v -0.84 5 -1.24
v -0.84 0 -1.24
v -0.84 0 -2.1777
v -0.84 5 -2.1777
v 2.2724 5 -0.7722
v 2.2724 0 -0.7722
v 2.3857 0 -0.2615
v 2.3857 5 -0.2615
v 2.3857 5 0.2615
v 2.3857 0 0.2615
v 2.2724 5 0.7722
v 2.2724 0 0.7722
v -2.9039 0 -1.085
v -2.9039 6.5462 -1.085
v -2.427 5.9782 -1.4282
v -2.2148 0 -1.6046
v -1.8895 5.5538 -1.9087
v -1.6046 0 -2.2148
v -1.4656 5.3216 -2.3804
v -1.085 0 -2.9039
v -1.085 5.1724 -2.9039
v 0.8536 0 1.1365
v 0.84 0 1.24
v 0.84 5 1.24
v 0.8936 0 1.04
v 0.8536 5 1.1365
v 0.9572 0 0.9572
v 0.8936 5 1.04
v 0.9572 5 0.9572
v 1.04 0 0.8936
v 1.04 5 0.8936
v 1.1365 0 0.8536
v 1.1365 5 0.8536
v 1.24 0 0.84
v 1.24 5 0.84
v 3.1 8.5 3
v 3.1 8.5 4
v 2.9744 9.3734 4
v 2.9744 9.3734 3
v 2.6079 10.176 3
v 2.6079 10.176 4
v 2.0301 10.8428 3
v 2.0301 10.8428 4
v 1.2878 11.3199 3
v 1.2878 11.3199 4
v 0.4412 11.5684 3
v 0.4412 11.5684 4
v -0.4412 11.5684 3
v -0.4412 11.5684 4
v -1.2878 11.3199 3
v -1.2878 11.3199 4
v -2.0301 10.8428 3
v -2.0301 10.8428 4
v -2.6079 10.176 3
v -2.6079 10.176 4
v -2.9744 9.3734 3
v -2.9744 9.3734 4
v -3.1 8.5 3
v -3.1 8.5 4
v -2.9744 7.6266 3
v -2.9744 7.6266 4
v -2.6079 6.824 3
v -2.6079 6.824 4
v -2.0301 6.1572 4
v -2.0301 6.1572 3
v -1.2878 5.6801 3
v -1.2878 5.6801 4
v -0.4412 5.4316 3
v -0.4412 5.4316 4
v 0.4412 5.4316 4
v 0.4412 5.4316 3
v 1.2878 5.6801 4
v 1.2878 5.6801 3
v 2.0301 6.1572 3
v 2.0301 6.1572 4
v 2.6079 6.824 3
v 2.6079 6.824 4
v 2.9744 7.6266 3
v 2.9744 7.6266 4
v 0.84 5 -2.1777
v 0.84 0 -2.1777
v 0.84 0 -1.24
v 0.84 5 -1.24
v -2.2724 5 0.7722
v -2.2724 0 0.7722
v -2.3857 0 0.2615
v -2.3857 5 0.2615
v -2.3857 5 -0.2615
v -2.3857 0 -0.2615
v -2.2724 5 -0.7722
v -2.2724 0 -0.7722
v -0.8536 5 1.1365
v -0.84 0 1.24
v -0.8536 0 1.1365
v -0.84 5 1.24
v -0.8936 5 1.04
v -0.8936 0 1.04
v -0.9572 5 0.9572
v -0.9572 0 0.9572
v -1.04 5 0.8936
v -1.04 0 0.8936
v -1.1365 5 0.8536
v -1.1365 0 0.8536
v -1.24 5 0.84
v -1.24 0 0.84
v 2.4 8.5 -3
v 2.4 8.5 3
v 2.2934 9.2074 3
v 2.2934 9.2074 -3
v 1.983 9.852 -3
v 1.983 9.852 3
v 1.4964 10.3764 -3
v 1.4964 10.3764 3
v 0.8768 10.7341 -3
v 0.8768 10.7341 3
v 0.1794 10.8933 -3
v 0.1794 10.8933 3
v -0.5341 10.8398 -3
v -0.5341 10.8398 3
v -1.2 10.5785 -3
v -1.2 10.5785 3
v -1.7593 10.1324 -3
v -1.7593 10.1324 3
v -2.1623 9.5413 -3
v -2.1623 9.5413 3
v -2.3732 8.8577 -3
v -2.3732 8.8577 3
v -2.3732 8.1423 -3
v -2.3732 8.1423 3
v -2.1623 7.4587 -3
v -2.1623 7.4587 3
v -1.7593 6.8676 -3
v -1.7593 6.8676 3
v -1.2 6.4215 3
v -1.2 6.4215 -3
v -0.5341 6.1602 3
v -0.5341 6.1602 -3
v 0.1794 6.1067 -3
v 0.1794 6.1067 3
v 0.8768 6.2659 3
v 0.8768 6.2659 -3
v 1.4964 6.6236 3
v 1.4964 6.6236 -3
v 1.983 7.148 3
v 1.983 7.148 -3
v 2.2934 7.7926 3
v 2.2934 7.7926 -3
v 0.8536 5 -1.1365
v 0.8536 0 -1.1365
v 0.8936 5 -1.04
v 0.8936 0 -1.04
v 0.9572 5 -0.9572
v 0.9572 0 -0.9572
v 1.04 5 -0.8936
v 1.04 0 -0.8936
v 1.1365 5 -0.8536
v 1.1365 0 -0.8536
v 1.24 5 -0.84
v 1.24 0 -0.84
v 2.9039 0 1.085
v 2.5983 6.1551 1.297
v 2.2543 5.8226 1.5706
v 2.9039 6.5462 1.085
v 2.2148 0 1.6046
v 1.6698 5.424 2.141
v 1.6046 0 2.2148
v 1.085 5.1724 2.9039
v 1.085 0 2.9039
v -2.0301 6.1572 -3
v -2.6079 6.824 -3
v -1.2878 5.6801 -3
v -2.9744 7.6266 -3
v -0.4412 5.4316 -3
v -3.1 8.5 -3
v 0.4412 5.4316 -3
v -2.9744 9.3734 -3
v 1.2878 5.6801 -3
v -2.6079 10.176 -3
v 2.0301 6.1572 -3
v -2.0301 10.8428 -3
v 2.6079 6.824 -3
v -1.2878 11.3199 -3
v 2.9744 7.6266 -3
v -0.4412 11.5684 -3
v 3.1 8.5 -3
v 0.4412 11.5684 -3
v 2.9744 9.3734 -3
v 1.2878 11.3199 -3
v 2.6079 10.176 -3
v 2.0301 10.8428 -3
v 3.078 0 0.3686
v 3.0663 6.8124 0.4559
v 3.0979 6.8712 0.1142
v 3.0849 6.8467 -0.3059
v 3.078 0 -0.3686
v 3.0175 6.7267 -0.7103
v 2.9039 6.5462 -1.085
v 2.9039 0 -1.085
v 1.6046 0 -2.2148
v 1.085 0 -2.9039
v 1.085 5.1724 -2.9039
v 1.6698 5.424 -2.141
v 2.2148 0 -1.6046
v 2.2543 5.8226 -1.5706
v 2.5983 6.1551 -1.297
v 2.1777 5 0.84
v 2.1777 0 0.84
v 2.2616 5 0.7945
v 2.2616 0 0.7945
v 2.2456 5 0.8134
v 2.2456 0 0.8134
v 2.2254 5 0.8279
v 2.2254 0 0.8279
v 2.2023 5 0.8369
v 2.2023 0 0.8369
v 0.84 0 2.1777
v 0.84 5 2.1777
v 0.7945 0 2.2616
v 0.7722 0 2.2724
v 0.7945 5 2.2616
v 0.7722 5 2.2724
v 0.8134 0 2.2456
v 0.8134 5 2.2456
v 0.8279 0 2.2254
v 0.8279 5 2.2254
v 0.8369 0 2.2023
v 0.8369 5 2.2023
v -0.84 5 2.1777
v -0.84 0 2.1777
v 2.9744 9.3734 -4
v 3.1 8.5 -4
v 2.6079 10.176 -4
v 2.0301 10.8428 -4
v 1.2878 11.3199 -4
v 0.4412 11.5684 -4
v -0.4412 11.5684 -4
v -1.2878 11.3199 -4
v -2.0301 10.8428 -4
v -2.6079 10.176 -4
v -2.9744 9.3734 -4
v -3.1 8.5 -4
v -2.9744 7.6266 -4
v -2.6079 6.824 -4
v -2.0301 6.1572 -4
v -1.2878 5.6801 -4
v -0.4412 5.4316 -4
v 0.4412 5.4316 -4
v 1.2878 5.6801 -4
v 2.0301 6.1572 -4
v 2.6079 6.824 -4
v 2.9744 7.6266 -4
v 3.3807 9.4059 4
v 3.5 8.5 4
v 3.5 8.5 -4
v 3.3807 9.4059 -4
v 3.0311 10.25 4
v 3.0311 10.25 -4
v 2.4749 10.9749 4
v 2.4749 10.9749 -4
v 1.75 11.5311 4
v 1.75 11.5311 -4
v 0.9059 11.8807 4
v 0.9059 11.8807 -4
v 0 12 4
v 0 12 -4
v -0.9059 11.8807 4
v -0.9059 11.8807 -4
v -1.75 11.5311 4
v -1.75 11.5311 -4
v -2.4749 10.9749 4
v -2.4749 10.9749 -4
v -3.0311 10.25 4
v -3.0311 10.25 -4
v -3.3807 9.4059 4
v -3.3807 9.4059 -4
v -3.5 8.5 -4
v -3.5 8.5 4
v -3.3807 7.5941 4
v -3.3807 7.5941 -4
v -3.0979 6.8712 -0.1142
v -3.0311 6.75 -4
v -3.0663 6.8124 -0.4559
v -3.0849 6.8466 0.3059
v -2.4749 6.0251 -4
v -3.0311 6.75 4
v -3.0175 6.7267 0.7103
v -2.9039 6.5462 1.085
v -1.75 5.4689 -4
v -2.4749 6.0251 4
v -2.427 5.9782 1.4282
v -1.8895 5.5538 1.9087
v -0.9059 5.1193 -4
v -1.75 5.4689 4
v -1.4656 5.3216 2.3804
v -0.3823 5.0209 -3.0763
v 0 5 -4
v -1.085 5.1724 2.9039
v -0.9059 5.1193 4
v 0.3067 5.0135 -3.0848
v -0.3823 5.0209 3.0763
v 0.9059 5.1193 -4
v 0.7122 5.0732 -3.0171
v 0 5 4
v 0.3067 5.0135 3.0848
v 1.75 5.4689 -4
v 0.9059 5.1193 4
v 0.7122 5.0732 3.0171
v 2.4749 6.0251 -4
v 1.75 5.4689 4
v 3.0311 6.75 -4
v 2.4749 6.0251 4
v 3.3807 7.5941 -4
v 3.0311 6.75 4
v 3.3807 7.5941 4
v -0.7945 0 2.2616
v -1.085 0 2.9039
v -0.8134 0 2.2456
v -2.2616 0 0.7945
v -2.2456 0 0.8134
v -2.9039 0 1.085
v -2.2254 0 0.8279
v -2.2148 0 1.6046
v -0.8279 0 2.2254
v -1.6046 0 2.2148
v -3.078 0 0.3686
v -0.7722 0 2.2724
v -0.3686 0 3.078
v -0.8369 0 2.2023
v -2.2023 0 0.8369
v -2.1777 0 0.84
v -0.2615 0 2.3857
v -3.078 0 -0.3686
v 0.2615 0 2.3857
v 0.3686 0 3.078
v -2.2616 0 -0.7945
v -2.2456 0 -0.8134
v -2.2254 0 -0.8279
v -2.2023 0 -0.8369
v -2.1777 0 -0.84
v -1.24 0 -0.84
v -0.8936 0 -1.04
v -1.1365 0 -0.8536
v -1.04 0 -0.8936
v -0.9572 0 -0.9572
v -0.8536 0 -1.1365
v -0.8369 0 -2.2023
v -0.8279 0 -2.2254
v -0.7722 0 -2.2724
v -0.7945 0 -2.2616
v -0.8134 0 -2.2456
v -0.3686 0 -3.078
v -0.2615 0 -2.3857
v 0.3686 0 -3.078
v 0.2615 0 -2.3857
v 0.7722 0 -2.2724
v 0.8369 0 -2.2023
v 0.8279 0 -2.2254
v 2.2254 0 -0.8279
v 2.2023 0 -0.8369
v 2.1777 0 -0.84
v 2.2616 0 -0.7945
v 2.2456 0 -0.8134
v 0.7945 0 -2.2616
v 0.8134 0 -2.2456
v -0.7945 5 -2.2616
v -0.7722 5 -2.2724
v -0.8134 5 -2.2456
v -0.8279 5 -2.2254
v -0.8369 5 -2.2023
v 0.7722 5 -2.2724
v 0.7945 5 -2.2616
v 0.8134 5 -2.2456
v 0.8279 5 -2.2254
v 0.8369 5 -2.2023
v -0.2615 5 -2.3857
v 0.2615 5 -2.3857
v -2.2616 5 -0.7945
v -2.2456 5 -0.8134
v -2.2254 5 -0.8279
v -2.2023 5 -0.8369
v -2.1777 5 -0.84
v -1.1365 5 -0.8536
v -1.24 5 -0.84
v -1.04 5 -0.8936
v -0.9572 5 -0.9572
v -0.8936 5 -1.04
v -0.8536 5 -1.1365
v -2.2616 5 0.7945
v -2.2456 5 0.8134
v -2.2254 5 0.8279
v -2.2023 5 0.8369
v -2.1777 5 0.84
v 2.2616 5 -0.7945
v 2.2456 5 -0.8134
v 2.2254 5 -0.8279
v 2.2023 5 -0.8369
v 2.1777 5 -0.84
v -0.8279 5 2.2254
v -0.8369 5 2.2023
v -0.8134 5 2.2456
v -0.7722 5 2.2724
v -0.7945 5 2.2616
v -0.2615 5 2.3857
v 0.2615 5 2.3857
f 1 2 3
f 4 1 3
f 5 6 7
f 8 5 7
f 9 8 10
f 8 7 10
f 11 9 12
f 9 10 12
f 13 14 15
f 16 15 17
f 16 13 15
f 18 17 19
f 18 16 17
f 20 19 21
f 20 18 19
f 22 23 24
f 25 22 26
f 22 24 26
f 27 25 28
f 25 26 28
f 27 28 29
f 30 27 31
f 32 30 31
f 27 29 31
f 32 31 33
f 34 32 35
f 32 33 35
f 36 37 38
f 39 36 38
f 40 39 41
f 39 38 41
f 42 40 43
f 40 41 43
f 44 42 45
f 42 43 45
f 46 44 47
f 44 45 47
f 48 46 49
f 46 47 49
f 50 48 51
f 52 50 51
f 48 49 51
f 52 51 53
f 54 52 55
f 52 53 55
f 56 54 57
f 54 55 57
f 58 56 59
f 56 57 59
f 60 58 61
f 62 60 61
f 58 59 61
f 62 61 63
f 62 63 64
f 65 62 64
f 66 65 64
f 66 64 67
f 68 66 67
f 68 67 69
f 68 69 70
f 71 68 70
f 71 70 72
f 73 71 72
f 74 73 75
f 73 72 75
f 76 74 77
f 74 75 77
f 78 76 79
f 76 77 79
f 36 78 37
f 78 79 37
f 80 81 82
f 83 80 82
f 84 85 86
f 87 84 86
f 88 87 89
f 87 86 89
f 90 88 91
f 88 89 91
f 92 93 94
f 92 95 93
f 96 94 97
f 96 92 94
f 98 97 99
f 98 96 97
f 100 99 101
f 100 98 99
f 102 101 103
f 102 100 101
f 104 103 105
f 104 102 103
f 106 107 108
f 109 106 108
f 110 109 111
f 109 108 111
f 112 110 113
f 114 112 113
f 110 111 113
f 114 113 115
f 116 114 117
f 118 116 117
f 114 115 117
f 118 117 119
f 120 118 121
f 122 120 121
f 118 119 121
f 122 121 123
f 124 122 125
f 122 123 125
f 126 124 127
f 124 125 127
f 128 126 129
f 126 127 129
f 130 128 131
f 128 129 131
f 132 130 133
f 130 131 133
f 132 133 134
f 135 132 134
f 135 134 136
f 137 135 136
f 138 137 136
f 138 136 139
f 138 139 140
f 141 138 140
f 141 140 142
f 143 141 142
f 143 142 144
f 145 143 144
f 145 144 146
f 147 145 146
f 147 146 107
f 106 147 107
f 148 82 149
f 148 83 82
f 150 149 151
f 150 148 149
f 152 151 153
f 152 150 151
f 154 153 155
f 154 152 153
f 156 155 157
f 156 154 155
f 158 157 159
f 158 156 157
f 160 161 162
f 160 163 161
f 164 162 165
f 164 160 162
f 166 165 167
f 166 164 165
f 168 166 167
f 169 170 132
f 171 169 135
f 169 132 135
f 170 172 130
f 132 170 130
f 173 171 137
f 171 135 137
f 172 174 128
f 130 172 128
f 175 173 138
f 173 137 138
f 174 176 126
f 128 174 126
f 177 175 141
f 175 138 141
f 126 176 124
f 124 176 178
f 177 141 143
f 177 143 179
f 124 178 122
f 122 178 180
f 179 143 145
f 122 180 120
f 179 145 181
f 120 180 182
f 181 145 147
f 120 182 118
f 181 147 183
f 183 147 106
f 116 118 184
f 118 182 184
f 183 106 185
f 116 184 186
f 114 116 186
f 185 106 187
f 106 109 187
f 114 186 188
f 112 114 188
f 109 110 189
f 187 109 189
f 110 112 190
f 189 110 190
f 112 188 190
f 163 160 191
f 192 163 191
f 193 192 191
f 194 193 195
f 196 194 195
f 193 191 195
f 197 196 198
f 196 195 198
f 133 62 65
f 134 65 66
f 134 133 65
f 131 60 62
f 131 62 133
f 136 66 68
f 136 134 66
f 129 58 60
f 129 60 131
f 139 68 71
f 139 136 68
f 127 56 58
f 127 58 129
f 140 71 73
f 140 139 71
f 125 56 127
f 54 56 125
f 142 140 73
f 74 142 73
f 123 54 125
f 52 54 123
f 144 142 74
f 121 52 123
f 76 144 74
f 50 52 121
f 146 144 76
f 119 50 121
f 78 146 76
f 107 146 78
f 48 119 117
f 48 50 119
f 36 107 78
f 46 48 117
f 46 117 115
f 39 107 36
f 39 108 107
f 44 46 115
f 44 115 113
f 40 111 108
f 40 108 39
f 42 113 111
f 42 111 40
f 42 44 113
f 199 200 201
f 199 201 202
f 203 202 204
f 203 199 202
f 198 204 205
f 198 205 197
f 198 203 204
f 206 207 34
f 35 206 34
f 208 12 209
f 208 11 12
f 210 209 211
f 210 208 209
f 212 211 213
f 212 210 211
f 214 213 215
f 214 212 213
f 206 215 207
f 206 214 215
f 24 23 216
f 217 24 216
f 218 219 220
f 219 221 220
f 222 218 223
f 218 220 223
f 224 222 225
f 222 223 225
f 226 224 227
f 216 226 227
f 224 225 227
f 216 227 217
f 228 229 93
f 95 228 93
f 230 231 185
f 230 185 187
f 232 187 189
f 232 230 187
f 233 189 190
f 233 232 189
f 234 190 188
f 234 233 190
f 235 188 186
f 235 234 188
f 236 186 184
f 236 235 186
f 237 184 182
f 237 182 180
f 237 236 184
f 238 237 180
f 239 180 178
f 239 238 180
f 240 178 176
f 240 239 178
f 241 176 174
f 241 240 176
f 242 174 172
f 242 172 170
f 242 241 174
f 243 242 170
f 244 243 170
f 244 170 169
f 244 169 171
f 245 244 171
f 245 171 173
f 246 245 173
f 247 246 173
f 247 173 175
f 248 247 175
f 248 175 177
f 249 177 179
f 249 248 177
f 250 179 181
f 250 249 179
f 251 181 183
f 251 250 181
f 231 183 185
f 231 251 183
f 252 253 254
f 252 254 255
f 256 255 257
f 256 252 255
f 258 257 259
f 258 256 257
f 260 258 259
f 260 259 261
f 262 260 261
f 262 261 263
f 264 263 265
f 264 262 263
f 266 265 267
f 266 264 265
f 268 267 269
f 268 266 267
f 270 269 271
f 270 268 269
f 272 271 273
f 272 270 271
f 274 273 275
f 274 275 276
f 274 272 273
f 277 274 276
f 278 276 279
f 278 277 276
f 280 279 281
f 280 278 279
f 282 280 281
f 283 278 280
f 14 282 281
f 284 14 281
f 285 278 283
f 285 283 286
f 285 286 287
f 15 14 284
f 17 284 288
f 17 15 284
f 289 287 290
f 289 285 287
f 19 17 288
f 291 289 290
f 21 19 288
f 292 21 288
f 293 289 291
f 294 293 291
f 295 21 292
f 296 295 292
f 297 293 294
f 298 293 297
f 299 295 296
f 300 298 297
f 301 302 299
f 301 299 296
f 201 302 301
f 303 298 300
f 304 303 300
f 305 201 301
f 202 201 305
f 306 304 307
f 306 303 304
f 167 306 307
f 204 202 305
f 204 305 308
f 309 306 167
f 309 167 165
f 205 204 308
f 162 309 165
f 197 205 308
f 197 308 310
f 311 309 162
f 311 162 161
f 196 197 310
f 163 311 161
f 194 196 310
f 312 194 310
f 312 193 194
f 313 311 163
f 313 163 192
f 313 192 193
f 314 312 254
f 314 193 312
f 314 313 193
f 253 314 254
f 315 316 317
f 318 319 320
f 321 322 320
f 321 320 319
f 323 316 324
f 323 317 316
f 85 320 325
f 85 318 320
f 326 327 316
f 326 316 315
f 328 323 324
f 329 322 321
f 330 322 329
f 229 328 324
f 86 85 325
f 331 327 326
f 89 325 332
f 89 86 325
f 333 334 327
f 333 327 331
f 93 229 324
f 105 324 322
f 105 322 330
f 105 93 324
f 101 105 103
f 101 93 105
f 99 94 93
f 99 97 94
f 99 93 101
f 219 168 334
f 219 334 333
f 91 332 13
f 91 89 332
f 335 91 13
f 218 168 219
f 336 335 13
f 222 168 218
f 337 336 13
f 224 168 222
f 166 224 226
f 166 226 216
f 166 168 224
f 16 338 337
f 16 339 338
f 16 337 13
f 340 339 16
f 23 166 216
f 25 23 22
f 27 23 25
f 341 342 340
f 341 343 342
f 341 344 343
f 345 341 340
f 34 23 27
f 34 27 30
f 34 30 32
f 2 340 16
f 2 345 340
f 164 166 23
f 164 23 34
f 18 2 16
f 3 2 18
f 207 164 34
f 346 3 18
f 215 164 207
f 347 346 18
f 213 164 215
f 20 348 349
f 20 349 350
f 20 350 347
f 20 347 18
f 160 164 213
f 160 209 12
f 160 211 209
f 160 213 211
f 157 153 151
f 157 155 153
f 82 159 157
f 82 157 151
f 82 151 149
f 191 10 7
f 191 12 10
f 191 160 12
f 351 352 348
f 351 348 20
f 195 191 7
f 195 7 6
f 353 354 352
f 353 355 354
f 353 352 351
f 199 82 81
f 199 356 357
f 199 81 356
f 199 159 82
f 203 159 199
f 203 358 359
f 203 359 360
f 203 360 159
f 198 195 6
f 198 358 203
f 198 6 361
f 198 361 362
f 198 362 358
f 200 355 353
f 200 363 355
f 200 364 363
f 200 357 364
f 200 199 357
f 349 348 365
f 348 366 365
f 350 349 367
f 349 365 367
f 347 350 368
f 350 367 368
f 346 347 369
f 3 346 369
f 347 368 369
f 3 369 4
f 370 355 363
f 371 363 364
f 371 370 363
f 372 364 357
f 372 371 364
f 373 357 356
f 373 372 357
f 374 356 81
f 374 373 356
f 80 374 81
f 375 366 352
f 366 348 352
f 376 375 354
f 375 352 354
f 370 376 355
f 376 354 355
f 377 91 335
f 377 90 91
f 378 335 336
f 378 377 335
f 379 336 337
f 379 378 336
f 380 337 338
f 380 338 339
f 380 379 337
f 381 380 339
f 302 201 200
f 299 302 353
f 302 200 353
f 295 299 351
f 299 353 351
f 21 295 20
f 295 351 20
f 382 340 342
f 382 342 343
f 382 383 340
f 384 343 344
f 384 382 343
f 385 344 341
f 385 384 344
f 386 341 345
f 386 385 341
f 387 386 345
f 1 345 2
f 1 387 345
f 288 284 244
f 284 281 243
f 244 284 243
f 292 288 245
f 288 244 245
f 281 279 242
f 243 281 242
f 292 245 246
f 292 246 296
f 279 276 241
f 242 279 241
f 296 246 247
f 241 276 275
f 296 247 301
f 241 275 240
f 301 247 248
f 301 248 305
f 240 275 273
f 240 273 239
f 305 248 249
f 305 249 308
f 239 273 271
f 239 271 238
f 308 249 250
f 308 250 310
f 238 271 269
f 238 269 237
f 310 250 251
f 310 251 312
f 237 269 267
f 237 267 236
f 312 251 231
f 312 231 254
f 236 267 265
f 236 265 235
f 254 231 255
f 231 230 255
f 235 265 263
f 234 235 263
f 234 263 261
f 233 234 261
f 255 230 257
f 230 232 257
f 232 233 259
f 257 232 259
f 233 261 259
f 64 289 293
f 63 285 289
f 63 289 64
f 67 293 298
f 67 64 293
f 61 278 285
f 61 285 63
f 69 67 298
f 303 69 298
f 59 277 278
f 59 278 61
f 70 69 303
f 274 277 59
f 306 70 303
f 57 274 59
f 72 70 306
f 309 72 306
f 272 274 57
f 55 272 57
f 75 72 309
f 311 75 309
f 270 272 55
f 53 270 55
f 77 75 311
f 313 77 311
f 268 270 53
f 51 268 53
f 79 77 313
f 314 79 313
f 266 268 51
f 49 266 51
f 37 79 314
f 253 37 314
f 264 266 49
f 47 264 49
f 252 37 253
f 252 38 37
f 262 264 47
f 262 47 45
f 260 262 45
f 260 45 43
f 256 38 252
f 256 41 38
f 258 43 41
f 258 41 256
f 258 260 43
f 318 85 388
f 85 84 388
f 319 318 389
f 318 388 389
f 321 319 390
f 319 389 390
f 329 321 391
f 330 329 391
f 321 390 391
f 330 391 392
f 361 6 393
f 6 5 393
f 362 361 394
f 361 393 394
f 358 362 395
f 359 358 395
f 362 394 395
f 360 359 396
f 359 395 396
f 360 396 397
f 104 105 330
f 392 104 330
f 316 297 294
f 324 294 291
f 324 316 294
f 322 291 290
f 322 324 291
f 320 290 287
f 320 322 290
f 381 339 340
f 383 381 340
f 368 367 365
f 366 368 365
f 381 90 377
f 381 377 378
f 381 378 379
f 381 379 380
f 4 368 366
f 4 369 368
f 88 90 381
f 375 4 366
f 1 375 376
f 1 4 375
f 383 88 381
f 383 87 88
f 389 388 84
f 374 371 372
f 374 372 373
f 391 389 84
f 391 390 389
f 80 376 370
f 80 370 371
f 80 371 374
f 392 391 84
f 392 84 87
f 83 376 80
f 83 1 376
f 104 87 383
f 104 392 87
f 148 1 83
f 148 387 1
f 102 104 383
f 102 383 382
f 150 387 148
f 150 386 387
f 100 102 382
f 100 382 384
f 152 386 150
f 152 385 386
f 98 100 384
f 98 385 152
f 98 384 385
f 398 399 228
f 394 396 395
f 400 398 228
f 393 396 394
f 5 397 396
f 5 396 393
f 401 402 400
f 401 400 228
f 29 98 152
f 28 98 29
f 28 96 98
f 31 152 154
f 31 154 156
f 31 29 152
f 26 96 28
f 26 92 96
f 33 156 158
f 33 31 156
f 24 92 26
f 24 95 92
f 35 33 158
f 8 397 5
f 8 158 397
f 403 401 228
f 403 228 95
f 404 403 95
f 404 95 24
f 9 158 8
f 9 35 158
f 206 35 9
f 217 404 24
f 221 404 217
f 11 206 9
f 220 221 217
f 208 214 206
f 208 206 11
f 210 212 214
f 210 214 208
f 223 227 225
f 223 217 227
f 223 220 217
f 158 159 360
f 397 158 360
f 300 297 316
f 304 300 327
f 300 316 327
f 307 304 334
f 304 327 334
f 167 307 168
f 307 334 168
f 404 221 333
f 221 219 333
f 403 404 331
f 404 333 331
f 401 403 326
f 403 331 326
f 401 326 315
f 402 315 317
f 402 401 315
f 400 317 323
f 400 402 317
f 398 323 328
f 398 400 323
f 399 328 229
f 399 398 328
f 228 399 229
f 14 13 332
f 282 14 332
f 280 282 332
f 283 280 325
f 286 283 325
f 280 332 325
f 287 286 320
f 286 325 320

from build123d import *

# Parameters (mm, degrees)
BOSS_EXTRUDE1_DEPTH = 7
FILLET1_R           = 6.2
FILLET2_R           = 6.2
FILLET3_R           = 6.2
FILLET4_R           = 6.2
CUT_EXTRUDE1_DEPTH  = 5
SKETCH5_R           = 3.5
BOSS_EXTRUDE2_DEPTH = 4
SKETCH9_R           = 2.4
CUT_EXTRUDE2_DEPTH  = 15.840822238
SKETCH10_R          = 3.1
CUT_EXTRUDE3_DEPTH  = 1
FILLET5_R           = 0.4
FILLET6_R           = 0.4
FILLET7_R           = 0.4
FILLET8_R           = 0.4
FILLET9_R           = 0.1
FILLET10_R          = 0.1
FILLET11_R          = 0.1
FILLET12_R          = 0.1
FILLET13_R          = 0.1
FILLET14_R          = 0.1
FILLET15_R          = 0.1
FILLET16_R          = 0.1


with BuildPart() as part:
    # Sketch2 → Boss-Extrude1 (new body)
    with BuildSketch(Plane(origin=(0, 0, 0), x_dir=(1, 0, 0), z_dir=(0, 1, 0))):
        with BuildLine():
            Line((-1.085, -1.085), (-1.085, -2.903924069))
            ThreePointArc((-1.085, -2.903924069), (0, -3.1), (1.085, -2.903924069))
            Line((1.085, -2.903924069), (1.085, -1.085))
            Line((1.085, -1.085), (2.903924069, -1.085))
            ThreePointArc((2.903924069, -1.085), (3.1, 0), (2.903924069, 1.085))
            Line((2.903924069, 1.085), (1.085, 1.085))
            Line((1.085, 1.085), (1.085, 2.903924069))
            ThreePointArc((1.085, 2.903924069), (0, 3.1), (-1.085, 2.903924069))
            Line((-1.085, 2.903924069), (-1.085, 1.085))
            Line((-1.085, 1.085), (-2.903924069, 1.085))
            ThreePointArc((-2.903924069, 1.085), (-3.1, 0), (-2.903924069, -1.085))
            Line((-2.903924069, -1.085), (-1.085, -1.085))
        make_face()
    extrude(amount=BOSS_EXTRUDE1_DEPTH)

    # Fillet1
    # the kernel refuses this fillet: 6.2 mm, written as the material it adds along each edge
    with BuildSketch(Plane(origin=(-1.085, 0, -1.085), x_dir=(0, 0, -1), z_dir=(0, 1, 0))) as fillet1_piece_1:
        with BuildLine():
            CenterArc((5.198154004, 5.198154004), FILLET1_R, 213.027198012, 23.945603977)
            Line((0, 1.818924069), (0, 0))
            Line((0, 0), (1.818924069, 0))
        make_face()
    extrude(amount=7)

    # Fillet2
    # the kernel refuses this fillet: 6.2 mm, written as the material it adds along each edge
    with BuildSketch(Plane(origin=(1.085, 0, -1.085), x_dir=(0, 0, -1), z_dir=(0, 1, 0))) as fillet2_piece_1:
        with BuildLine():
            CenterArc((5.198154004, -5.198154004), FILLET2_R, 123.027198012, 23.945603977)
            Line((0, -1.818924069), (0, 0))
            Line((0, 0), (1.818924069, 0))
        make_face()
    extrude(amount=7)

    # Fillet3
    # the kernel refuses this fillet: 6.2 mm, written as the material it adds along each edge
    with BuildSketch(Plane(origin=(1.085, 0, 1.085), x_dir=(1, 0, 0), z_dir=(0, 1, 0))) as fillet3_piece_1:
        with BuildLine():
            CenterArc((5.198154004, -5.198154004), FILLET3_R, 123.027198012, 23.945603977)
            Line((0, -1.818924069), (0, 0))
            Line((0, 0), (1.818924069, 0))
        make_face()
    extrude(amount=7)

    # Fillet4
    # the kernel refuses this fillet: 6.2 mm, written as the material it adds along each edge
    with BuildSketch(Plane(origin=(-1.085, 0, 1.085), x_dir=(0, 0, 1), z_dir=(0, 1, 0))) as fillet4_piece_1:
        with BuildLine():
            CenterArc((5.198154004, -5.198154004), FILLET4_R, 123.027198012, 23.945603977)
            Line((0, -1.818924069), (0, 0))
            Line((0, 0), (1.818924069, 0))
        make_face()
    extrude(amount=7)

    # Sketch4 → Cut-Extrude1 (cut)
    with BuildSketch(Plane.XZ):
        with BuildLine():
            Line((0.84, 0.84), (0.84, 2.248199279))
            ThreePointArc((0.84, 2.248199279), (0, 2.4), (-0.84, 2.248199279))
            Line((-0.84, 2.248199279), (-0.84, 0.84))
            Line((-0.84, 0.84), (-2.248199279, 0.84))
            ThreePointArc((-2.248199279, 0.84), (-2.4, 0), (-2.248199279, -0.84))
            Line((-2.248199279, -0.84), (-0.84, -0.84))
            Line((-0.84, -0.84), (-0.84, -2.248199279))
            ThreePointArc((-0.84, -2.248199279), (0, -2.4), (0.84, -2.248199279))
            Line((0.84, -2.248199279), (0.84, -0.84))
            Line((0.84, -0.84), (2.248199279, -0.84))
            ThreePointArc((2.248199279, -0.84), (2.4, 0), (2.248199279, 0.84))
            Line((2.248199279, 0.84), (0.84, 0.84))
        make_face()
    extrude(amount=-CUT_EXTRUDE1_DEPTH, mode=Mode.SUBTRACT)

    # Sketch5 → Boss-Extrude2 (add, symmetric)
    with BuildSketch(Plane.XY):
        with Locations((0, 8.5)):
            Circle(SKETCH5_R)
    extrude(amount=BOSS_EXTRUDE2_DEPTH, both=True)

    # Sketch9 → Cut-Extrude2 (cut, through all)
    with BuildSketch(Plane.XY.offset(4)):
        with Locations((0, 8.5)):
            Circle(SKETCH9_R)
    extrude(amount=-CUT_EXTRUDE2_DEPTH, mode=Mode.SUBTRACT)

    # Sketch10 → Cut-Extrude3 (cut)
    with BuildSketch(Plane.XY.offset(4)):
        with Locations((0, 8.5)):
            Circle(SKETCH10_R)
    cut_extrude3 = extrude(amount=-CUT_EXTRUDE3_DEPTH, mode=Mode.SUBTRACT)

    # Mirror1: Cut-Extrude3 across plane
    add(cut_extrude3.mirror(Plane.XY), mode=Mode.SUBTRACT)

    # Fillet5
    fillet5_edges = [part.edges().sort_by_distance(p)[0] for p in [
        (0.84, 2.5, 0.84),
    ]]
    fillet(fillet5_edges, radius=FILLET5_R)

    # Fillet6
    fillet6_edges = [part.edges().sort_by_distance(p)[0] for p in [
        (-0.84, 2.5, 0.84),
    ]]
    fillet(fillet6_edges, radius=FILLET6_R)

    # Fillet7
    fillet7_edges = [part.edges().sort_by_distance(p)[0] for p in [
        (-0.84, 2.5, -0.84),
    ]]
    fillet(fillet7_edges, radius=FILLET7_R)

    # Fillet8
    fillet8_edges = [part.edges().sort_by_distance(p)[0] for p in [
        (0.84, 2.5, -0.84),
    ]]
    fillet(fillet8_edges, radius=FILLET8_R)

    # Fillet9
    fillet9_edges = [part.edges().sort_by_distance(p)[0] for p in [
        (-0.84, 2.5, 2.248199279),
    ]]
    fillet(fillet9_edges, radius=FILLET9_R)

    # Fillet10
    fillet10_edges = [part.edges().sort_by_distance(p)[0] for p in [
        (0.84, 2.5, 2.248199279),
    ]]
    fillet(fillet10_edges, radius=FILLET10_R)

    # Fillet11
    fillet11_edges = [part.edges().sort_by_distance(p)[0] for p in [
        (-2.248199279, 2.5, -0.84),
    ]]
    fillet(fillet11_edges, radius=FILLET11_R)

    # Fillet12
    fillet12_edges = [part.edges().sort_by_distance(p)[0] for p in [
        (-2.248199279, 2.5, 0.84),
    ]]
    fillet(fillet12_edges, radius=FILLET12_R)

    # Fillet13
    fillet13_edges = [part.edges().sort_by_distance(p)[0] for p in [
        (2.248199279, 2.5, 0.84),
    ]]
    fillet(fillet13_edges, radius=FILLET13_R)

    # Fillet14
    fillet14_edges = [part.edges().sort_by_distance(p)[0] for p in [
        (2.248199279, 2.5, -0.84),
    ]]
    fillet(fillet14_edges, radius=FILLET14_R)

    # Fillet15
    fillet15_edges = [part.edges().sort_by_distance(p)[0] for p in [
        (-0.84, 2.5, -2.248199279),
    ]]
    fillet(fillet15_edges, radius=FILLET15_R)

    # Fillet16
    fillet16_edges = [part.edges().sort_by_distance(p)[0] for p in [
        (0.84, 2.5, -2.248199279),
    ]]
    fillet(fillet16_edges, radius=FILLET16_R)


solid = part.part
